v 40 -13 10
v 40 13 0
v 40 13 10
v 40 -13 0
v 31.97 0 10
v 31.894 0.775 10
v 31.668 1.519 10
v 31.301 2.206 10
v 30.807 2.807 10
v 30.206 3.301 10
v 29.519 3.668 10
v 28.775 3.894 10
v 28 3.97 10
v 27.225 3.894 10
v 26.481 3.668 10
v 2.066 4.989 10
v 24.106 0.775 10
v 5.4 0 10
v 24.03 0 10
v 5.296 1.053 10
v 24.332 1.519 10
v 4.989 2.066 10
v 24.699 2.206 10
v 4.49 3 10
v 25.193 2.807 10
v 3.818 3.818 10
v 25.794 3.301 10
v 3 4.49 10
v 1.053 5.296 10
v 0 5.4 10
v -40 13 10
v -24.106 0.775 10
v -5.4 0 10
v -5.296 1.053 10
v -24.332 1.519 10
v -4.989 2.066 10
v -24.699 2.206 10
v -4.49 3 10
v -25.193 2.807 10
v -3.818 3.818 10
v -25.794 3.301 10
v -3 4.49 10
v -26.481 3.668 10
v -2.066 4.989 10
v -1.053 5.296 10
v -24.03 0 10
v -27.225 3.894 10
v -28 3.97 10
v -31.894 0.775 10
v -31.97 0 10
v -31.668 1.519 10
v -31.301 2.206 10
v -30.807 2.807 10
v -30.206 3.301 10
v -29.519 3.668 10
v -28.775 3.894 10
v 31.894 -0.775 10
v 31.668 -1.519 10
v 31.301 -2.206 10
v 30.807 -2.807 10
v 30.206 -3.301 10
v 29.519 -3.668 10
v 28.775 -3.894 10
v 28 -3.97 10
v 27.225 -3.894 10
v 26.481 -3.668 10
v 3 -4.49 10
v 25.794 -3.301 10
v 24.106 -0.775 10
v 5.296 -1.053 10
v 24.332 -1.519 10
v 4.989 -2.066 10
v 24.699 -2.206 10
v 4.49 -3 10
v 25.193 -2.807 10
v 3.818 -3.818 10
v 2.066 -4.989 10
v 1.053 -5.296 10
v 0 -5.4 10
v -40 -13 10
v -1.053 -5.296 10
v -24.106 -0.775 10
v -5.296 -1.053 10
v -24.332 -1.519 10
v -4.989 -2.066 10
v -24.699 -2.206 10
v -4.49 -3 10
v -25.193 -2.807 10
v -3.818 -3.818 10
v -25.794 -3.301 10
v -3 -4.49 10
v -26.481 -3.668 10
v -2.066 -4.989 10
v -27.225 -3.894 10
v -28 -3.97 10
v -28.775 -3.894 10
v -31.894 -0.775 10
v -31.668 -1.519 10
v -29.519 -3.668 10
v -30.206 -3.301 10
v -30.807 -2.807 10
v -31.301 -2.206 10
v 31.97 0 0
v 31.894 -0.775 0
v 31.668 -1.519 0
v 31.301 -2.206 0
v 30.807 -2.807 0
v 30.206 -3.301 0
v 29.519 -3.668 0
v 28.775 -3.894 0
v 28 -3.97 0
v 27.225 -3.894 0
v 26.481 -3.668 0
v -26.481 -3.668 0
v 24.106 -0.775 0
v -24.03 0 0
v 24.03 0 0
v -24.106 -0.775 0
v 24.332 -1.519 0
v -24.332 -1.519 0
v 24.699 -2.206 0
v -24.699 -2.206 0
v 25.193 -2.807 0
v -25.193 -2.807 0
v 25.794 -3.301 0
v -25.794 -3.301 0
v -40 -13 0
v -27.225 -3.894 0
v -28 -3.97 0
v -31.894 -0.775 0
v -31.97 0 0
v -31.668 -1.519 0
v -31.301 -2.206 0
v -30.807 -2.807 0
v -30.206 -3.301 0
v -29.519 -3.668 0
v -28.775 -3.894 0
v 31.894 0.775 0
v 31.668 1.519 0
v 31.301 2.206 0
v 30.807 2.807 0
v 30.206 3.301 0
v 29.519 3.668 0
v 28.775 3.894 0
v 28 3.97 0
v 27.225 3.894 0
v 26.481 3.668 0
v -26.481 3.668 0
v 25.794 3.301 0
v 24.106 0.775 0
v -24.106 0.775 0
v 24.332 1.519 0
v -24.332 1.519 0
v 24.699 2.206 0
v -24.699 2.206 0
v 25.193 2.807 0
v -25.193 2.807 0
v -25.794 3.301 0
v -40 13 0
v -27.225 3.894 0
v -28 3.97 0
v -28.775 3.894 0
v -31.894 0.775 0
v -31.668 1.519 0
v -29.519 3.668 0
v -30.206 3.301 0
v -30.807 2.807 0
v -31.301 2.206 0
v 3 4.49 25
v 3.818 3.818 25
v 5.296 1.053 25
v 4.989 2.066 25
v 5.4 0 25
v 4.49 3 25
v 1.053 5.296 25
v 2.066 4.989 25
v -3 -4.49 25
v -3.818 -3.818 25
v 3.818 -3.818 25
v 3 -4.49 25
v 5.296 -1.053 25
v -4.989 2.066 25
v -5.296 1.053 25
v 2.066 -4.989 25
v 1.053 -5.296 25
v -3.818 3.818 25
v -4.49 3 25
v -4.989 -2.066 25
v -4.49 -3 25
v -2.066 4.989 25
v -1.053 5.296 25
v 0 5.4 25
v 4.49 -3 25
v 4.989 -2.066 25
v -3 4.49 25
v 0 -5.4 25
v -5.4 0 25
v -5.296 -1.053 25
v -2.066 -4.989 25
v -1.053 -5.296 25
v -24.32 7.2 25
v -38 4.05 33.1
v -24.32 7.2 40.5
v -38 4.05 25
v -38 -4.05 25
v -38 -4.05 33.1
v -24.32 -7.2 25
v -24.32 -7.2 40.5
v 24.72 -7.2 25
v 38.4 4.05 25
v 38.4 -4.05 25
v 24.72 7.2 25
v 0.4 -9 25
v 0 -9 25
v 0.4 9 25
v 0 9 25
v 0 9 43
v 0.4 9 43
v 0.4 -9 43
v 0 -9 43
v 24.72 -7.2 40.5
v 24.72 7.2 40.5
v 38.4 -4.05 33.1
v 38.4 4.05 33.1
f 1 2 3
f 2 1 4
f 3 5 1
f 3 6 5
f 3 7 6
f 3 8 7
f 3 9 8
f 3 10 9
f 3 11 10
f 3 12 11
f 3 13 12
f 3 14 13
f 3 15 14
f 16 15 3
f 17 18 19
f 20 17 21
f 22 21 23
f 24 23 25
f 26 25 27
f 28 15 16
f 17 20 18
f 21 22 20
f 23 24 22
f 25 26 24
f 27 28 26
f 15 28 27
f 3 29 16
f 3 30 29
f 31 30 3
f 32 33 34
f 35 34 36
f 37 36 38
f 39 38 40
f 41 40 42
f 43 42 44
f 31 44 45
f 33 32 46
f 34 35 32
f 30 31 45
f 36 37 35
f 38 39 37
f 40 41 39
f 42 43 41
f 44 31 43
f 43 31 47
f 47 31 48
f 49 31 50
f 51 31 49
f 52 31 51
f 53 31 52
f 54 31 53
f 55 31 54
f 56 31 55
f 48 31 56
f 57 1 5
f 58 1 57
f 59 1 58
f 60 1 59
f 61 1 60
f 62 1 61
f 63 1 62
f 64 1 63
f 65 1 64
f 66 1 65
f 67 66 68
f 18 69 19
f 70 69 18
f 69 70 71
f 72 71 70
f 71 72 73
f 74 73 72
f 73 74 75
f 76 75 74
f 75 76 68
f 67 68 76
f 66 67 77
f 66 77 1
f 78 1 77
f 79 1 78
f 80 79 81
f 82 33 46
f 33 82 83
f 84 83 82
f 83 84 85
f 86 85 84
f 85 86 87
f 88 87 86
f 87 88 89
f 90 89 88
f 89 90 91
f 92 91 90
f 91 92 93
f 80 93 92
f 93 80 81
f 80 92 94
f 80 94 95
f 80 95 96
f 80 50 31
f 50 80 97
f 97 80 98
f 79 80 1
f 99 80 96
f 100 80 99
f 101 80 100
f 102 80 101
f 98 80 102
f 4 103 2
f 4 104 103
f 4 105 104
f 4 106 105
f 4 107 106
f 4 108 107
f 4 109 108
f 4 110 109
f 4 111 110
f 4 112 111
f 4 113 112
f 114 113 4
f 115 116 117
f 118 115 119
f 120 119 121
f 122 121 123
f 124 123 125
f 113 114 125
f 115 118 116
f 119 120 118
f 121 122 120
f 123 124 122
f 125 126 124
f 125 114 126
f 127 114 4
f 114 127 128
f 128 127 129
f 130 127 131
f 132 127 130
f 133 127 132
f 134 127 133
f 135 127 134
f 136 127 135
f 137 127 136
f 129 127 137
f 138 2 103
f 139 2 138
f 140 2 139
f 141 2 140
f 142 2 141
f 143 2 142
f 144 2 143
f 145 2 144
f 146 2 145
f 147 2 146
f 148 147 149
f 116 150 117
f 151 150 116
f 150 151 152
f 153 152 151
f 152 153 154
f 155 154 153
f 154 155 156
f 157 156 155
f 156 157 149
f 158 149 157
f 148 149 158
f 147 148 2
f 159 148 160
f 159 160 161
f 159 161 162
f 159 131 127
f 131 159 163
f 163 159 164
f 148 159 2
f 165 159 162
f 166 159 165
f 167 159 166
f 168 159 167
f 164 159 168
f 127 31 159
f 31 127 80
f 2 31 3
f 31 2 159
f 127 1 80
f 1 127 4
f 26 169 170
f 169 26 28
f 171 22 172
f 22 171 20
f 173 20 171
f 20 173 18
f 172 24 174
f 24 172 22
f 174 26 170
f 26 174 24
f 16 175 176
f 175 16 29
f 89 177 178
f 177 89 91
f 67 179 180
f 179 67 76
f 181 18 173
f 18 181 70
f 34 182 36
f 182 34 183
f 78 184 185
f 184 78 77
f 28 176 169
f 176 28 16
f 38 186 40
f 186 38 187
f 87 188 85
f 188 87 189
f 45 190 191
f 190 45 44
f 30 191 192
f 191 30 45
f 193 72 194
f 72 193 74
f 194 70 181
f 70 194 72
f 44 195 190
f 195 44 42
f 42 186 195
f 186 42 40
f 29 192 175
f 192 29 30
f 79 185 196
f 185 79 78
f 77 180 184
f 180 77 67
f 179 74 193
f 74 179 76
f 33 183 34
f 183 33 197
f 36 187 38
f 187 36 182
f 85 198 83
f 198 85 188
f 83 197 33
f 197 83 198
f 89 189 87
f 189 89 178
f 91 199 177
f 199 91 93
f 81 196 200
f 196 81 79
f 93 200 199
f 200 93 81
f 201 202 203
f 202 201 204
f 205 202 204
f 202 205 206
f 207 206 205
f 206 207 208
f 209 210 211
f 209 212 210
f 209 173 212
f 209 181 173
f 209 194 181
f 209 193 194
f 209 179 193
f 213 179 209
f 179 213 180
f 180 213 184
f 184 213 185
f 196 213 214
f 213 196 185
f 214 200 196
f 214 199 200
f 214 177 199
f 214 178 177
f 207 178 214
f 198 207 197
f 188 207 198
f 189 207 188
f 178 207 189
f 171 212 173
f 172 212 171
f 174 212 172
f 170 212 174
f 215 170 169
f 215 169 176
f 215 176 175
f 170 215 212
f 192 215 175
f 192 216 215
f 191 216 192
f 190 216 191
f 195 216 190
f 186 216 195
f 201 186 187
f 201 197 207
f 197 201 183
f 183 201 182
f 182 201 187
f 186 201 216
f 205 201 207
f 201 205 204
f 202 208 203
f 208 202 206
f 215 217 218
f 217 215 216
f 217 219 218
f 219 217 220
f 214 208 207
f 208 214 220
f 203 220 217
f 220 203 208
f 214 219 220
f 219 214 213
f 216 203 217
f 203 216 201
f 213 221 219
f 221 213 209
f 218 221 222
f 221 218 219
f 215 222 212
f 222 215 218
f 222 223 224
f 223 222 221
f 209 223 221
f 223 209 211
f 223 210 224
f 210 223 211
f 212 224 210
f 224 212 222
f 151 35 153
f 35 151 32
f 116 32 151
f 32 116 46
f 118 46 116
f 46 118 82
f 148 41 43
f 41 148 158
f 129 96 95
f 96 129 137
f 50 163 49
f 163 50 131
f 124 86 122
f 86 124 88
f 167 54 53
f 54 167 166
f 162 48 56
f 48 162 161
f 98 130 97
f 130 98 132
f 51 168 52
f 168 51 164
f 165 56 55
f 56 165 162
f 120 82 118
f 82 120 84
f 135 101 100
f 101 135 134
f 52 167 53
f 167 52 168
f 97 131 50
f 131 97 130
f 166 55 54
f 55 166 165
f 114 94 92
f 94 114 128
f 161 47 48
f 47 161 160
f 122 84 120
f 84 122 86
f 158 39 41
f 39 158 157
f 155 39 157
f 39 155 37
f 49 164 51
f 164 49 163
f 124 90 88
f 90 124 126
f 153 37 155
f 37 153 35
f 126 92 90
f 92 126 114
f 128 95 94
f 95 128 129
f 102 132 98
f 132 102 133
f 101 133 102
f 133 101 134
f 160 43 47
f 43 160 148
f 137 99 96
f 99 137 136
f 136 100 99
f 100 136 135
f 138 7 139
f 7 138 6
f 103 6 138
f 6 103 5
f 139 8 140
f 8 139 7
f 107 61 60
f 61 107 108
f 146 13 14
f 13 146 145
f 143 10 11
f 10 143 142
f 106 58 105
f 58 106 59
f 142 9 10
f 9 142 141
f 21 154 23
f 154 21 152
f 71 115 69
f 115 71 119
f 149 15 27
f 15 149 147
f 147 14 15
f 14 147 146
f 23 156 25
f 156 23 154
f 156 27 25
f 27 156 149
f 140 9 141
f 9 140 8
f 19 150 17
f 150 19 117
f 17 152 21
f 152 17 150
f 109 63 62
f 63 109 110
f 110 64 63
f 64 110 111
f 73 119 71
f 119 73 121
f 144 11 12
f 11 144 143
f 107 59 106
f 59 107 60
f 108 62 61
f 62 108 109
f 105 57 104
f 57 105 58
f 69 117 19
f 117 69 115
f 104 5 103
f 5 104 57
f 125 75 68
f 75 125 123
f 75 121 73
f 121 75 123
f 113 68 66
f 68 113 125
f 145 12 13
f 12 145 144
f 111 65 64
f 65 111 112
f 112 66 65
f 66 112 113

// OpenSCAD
$fn = 32;

// ----------------------------------------------------------------------
// Boat cleat: 80 mm base, horn 34 mm up
// ----------------------------------------------------------------------

// --- parameters (mm) ---
base_l = 80;              // base length
base_w = 26;              // base width
base_t = 10;              // base thickness
horn_len = 76;            // horn length
horn_d = 18;              // horn diameter at the middle
horn_z = 34;              // horn axis height
end_drop = 10;            // how far the horn tips drop
post_d = 10.8;            // centre post diameter
holes_d = 7.94;           // fixing holes
hole_x = 28;              // fixing hole spacing

difference() {
  union() {
    translate([-40, -13, 0]) cube([base_l, base_w, base_t]);
    /* centre post, sunk 1 mm into the base */
    translate([0, 0, 9]) cylinder(h = 25, d = post_d);
    /* horn: a hull chain of boxes, full in the middle and lighter at the tips */
    hull() {
      translate([-38, -4.05, 25]) cube([0.4, 8.1, 8.1], center = false);
      translate([-24.32, -7.2, 25]) cube([0.4, 14.4, 15.5], center = false);
    }
    hull() {
      translate([-24.32, -7.2, 25]) cube([0.4, 14.4, 15.5], center = false);
      translate([0, -9, 25]) cube([0.4, 18, 18], center = false);
    }
    hull() {
      translate([0, -9, 25]) cube([0.4, 18, 18], center = false);
      translate([24.32, -7.2, 25]) cube([0.4, 14.4, 15.5], center = false);
    }
    hull() {
      translate([24.32, -7.2, 25]) cube([0.4, 14.4, 15.5], center = false);
      translate([38, -4.05, 25]) cube([0.4, 8.1, 8.1], center = false);
    }
  }
  translate([-28, 0, -2.5]) cylinder(h = base_t + 5, d = holes_d);
  translate([28, 0, -2.5]) cylinder(h = base_t + 5, d = holes_d);
}
